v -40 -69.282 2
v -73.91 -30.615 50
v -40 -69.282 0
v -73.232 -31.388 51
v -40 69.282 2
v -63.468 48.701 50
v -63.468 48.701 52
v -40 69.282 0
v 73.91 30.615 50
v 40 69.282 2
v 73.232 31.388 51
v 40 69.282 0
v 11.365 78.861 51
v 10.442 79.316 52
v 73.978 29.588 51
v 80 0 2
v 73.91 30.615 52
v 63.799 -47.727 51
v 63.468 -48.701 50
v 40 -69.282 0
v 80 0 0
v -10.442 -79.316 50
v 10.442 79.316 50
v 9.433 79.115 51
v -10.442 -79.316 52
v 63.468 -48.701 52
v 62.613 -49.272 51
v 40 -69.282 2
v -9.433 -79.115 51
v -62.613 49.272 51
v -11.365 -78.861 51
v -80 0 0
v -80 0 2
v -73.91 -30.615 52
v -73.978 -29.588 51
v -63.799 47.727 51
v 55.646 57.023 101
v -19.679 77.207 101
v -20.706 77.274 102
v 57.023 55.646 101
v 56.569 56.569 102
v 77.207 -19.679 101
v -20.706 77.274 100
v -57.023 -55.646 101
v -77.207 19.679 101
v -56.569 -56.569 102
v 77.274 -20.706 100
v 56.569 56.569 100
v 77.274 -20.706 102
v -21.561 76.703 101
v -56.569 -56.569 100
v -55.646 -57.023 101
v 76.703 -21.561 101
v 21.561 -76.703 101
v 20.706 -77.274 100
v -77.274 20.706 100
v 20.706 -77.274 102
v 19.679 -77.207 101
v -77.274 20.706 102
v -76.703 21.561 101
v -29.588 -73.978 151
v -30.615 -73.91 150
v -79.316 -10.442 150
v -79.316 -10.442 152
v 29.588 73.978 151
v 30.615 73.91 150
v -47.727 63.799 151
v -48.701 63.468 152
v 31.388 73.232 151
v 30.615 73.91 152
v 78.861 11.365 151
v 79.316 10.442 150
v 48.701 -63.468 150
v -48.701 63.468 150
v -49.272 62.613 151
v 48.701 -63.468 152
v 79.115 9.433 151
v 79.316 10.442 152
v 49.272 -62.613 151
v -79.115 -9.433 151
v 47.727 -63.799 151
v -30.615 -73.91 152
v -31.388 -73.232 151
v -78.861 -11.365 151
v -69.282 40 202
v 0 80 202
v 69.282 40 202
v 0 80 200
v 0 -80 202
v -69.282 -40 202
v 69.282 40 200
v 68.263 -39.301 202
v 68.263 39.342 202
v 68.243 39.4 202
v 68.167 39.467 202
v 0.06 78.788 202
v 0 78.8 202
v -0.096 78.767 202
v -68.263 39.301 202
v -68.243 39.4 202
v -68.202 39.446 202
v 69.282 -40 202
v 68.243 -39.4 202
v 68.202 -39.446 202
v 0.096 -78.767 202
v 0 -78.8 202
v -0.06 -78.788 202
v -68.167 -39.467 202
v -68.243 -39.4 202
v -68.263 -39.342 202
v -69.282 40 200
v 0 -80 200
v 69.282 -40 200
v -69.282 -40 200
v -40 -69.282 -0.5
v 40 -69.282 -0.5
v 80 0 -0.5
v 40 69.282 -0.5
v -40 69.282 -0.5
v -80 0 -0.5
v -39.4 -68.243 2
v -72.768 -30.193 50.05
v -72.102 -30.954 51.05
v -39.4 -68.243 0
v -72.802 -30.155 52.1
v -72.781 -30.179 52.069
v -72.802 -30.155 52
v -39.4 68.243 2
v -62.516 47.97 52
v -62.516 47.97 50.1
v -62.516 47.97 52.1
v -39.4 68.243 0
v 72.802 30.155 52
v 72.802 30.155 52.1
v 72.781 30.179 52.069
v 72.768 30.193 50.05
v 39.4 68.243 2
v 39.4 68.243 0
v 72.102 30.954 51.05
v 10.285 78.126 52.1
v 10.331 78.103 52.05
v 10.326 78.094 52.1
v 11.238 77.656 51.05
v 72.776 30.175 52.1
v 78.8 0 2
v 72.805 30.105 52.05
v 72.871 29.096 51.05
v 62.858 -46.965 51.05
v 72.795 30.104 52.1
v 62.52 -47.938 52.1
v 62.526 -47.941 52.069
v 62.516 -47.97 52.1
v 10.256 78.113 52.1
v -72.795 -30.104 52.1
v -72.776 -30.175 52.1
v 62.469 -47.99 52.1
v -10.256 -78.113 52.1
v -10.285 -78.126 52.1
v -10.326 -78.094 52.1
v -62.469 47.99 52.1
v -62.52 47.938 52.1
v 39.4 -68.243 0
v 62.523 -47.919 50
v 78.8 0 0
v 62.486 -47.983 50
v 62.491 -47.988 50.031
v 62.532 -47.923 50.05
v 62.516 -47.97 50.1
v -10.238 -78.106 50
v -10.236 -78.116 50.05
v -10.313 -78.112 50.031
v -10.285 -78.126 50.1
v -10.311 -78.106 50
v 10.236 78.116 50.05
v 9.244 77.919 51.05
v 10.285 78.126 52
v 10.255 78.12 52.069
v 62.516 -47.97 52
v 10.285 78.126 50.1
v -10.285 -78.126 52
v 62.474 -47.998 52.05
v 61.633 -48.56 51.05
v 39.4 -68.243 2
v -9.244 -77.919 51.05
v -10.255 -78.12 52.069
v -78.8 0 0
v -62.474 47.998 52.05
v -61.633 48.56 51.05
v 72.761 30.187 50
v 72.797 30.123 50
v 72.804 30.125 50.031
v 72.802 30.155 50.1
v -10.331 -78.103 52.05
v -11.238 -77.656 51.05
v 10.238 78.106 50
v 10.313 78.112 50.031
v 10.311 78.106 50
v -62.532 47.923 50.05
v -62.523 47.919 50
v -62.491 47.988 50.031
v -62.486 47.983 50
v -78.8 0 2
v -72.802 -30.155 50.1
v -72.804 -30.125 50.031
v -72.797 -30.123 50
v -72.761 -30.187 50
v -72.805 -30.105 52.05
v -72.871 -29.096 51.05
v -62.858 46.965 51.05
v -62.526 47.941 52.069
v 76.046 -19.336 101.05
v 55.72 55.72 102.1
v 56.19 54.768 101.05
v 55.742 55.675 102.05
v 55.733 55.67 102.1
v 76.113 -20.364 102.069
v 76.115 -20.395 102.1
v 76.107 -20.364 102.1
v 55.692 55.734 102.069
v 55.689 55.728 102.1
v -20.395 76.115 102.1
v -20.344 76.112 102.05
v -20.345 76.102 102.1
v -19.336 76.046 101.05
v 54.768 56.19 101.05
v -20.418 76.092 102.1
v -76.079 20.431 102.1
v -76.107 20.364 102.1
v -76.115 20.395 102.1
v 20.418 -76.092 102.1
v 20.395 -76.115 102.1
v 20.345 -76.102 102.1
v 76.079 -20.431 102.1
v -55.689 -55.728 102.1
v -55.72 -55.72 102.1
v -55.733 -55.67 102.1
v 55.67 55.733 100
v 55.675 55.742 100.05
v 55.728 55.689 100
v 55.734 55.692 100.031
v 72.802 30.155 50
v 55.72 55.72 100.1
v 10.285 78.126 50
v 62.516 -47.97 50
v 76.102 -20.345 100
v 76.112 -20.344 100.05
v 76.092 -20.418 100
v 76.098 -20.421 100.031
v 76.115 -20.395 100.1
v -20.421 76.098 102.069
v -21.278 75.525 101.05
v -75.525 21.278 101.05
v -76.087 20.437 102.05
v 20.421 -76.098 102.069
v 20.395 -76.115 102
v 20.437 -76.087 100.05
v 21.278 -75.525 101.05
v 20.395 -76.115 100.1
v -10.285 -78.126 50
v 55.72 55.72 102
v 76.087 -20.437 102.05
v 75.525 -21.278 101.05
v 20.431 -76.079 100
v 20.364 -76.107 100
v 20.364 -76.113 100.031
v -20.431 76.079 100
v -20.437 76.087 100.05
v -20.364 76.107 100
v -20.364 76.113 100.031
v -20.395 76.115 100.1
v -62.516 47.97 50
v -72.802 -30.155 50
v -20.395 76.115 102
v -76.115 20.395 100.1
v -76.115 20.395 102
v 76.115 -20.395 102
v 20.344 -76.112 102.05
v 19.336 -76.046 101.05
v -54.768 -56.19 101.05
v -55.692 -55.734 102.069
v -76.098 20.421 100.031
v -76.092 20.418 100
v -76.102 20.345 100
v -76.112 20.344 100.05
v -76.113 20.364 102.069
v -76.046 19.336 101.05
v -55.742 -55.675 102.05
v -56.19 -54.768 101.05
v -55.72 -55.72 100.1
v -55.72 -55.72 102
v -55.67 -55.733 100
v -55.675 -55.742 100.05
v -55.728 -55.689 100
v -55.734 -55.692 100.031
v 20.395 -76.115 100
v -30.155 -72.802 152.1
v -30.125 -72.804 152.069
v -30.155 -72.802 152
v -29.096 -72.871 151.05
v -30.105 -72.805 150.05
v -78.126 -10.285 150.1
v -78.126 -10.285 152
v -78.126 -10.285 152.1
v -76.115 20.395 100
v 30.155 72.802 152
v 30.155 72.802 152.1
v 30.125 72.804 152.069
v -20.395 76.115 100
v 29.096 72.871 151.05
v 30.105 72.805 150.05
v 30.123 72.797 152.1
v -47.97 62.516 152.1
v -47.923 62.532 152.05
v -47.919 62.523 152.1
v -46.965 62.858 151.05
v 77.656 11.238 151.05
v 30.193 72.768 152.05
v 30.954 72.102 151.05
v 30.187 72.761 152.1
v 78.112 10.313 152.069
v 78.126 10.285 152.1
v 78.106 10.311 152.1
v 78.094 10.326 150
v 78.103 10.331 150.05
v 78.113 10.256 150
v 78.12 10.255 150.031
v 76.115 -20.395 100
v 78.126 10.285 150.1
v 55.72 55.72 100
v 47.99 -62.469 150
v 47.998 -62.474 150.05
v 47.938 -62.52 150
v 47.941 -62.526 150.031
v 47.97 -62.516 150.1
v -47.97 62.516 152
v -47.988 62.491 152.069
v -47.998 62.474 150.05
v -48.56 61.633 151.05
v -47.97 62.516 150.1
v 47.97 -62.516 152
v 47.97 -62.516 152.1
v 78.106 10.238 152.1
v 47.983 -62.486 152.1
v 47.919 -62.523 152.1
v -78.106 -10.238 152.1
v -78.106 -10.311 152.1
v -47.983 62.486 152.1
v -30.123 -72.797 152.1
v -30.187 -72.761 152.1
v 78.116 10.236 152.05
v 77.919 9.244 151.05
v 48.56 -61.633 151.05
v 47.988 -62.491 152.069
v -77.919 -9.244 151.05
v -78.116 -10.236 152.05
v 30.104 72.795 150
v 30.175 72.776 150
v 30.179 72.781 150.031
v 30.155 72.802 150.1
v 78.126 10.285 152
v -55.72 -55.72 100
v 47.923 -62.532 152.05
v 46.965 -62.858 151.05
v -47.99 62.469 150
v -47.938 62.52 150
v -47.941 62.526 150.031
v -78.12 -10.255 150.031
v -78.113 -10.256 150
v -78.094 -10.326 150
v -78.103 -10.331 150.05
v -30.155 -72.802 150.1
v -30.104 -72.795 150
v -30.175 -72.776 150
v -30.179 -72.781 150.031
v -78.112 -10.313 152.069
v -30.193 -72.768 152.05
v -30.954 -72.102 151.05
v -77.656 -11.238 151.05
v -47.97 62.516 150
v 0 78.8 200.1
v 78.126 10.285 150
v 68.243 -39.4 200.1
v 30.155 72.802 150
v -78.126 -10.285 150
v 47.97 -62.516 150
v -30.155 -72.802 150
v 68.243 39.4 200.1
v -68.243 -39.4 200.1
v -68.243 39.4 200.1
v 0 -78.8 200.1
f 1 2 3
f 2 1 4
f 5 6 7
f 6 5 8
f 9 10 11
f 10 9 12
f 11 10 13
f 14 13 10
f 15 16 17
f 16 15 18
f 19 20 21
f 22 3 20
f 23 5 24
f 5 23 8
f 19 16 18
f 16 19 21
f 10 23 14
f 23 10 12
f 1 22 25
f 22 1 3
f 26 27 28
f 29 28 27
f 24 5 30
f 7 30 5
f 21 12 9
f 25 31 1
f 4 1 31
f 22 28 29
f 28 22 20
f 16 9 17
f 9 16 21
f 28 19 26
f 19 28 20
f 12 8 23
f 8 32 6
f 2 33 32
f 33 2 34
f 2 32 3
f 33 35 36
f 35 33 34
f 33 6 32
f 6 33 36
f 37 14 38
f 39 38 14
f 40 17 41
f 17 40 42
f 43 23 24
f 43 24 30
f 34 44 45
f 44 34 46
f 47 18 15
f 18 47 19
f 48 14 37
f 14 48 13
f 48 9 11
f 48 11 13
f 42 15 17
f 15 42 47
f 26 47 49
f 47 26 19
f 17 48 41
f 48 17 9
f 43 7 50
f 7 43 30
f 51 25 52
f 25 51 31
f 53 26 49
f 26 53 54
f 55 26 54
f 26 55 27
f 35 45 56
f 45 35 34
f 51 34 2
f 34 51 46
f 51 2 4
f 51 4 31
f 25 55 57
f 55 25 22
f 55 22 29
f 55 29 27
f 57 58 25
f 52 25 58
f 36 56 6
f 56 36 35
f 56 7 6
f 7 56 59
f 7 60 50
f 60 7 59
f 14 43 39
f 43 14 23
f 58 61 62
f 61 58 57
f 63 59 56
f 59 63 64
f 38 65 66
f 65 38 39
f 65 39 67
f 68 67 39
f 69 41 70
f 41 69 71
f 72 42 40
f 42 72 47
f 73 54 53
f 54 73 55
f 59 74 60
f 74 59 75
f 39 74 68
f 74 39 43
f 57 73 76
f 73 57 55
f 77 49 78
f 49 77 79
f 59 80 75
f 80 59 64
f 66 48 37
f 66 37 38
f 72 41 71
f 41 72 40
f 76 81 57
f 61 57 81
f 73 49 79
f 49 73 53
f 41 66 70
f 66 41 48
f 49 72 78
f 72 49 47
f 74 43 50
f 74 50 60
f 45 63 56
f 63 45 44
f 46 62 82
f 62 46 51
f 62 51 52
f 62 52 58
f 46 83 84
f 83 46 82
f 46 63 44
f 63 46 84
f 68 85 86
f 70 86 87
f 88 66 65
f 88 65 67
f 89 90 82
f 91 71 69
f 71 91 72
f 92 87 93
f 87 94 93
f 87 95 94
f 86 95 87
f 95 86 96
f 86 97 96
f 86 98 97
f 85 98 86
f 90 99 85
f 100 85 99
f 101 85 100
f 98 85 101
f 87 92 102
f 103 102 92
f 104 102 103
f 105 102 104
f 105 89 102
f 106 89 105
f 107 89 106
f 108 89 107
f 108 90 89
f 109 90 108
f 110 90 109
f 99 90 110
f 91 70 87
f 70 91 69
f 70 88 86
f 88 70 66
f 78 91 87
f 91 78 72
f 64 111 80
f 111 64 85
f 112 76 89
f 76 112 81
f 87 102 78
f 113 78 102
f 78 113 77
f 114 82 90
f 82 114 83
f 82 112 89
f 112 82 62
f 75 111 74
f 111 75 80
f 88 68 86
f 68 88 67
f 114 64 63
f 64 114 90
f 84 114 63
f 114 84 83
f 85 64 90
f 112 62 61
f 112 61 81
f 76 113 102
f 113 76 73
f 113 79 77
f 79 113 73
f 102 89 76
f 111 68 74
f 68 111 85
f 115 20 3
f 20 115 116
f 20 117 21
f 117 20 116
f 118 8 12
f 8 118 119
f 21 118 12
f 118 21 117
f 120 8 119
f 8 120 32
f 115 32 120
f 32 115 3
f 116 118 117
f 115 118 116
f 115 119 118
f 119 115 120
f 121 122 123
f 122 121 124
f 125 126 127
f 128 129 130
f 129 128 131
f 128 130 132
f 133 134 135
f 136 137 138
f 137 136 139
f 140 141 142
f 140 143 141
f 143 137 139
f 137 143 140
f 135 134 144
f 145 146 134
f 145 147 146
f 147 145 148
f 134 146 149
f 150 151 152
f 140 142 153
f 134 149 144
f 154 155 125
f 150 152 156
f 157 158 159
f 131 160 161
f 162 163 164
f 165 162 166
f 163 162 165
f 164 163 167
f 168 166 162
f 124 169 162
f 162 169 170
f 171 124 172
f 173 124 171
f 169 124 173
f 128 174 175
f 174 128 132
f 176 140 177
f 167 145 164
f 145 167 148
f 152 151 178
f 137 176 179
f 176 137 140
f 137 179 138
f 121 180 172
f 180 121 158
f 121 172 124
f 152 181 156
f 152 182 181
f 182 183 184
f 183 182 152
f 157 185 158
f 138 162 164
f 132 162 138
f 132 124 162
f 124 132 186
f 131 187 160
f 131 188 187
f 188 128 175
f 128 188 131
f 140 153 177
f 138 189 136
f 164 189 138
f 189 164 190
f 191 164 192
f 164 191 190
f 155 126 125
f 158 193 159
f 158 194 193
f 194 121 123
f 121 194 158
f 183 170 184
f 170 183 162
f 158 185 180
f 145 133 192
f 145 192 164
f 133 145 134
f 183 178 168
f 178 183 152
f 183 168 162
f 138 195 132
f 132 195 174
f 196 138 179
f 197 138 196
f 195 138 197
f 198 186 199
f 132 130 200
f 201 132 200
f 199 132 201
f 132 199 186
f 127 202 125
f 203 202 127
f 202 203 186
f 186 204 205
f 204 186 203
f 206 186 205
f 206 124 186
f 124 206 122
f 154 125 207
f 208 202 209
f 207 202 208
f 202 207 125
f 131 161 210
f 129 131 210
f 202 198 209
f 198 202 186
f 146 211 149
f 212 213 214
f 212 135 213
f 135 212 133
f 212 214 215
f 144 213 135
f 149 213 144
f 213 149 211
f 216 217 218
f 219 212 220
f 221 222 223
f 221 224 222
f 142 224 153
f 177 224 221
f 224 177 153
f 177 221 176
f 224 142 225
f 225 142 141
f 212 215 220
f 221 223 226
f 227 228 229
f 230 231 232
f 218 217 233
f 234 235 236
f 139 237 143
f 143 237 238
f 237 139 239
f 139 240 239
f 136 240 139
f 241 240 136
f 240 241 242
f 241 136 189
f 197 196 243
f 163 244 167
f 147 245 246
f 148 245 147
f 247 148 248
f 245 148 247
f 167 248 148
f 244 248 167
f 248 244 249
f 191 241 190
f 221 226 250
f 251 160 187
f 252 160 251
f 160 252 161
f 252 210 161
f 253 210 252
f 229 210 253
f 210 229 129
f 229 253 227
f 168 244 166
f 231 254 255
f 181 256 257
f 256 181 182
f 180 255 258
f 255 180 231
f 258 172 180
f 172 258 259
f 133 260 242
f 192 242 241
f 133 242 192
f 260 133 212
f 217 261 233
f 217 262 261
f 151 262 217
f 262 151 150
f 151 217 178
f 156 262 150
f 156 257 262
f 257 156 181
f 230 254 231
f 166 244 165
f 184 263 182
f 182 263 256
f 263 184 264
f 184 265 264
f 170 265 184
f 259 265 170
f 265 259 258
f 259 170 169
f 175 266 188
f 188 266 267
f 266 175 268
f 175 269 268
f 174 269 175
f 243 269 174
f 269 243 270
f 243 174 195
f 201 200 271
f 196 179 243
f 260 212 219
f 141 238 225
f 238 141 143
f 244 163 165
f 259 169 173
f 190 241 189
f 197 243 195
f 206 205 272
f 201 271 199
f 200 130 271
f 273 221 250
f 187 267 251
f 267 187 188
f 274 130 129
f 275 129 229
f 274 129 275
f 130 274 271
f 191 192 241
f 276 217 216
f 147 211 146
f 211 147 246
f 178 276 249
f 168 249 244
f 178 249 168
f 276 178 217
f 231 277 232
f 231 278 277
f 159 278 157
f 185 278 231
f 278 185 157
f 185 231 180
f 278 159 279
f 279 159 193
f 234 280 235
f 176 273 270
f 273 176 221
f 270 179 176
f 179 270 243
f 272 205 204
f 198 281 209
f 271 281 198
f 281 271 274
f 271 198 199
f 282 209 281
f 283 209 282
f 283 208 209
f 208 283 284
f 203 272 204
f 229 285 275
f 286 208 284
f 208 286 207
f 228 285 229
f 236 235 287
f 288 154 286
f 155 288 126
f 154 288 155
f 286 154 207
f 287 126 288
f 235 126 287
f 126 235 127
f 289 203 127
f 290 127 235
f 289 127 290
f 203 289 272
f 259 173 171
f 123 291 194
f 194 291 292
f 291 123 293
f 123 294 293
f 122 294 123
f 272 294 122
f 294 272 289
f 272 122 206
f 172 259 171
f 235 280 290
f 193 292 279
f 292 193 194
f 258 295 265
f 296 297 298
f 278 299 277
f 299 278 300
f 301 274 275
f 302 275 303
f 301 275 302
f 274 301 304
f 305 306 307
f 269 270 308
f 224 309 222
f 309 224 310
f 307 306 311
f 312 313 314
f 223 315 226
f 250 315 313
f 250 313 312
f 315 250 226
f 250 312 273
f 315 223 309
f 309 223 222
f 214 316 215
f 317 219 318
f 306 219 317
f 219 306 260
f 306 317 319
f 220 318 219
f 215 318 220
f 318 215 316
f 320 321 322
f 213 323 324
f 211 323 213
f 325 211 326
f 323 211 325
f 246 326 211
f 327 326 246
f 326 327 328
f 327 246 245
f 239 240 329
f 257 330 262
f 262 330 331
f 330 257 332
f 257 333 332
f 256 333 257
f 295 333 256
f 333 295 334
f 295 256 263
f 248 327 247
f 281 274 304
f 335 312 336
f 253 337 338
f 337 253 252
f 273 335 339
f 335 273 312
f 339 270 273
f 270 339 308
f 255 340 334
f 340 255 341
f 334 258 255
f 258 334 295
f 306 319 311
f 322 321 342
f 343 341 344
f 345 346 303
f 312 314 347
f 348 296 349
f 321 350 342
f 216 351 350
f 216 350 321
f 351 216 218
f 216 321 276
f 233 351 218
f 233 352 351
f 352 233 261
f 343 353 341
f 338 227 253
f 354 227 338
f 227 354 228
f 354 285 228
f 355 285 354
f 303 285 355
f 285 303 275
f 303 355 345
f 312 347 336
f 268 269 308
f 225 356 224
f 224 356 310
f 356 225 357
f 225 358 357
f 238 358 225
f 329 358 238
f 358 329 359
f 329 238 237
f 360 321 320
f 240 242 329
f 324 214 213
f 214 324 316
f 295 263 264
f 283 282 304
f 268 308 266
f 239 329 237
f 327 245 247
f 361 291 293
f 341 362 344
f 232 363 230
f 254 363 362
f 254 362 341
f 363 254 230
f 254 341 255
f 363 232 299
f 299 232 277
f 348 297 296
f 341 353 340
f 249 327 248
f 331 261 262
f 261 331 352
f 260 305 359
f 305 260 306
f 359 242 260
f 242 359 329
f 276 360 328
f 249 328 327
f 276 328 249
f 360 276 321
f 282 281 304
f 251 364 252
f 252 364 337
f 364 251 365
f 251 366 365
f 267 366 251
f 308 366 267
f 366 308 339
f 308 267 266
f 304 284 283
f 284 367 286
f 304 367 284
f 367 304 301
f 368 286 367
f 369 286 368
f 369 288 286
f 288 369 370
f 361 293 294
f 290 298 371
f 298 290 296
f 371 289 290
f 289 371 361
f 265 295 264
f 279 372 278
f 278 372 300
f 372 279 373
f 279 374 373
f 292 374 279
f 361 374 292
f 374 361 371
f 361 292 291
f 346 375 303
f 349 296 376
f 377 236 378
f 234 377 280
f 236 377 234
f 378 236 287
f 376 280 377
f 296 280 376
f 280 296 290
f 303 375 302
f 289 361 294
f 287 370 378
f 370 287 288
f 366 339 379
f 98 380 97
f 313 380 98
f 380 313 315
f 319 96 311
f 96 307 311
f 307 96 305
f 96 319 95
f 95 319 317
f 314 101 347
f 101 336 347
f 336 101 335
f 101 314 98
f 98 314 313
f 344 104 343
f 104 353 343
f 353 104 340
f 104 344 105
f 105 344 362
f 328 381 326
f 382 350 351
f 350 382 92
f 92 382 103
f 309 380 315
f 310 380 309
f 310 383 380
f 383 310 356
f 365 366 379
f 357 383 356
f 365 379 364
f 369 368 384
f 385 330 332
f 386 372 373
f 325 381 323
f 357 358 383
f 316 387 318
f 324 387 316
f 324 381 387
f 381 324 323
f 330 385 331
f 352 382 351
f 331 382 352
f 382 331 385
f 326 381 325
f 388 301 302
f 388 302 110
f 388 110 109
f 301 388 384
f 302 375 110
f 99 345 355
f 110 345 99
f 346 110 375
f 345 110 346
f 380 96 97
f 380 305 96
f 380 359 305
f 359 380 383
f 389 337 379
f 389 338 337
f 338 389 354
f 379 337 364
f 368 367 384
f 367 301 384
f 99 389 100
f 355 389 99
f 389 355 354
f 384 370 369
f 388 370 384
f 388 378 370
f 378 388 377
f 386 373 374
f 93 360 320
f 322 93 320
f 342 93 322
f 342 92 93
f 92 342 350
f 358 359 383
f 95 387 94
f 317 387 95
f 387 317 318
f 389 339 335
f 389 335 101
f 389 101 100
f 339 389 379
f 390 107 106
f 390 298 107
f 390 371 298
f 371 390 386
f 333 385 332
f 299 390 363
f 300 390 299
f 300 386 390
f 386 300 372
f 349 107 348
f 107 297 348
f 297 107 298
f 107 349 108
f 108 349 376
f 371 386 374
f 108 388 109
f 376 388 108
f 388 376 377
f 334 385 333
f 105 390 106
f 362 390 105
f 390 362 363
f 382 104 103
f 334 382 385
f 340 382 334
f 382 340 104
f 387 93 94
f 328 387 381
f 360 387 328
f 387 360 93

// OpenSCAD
$border=1.2;
$knick_height = 50;
$knick_count = 4;
$bottom_height = 1;

difference(){
    union(){
        
        cylinder(r=80, h=1, $fn=6, center=true);
        
        for ( layer = [1:$knick_count]) {
            hull(){
                translate([0,0, $bottom_height + (layer-1)*$knick_height ]) 
                rotate([0, 0, 90/$knick_count * (layer-1) ]) 
                cylinder(r=80, h=2, $fn=6, center=true);
                
                translate([0, 0, $bottom_height + (layer)*$knick_height ]) 
                rotate([0,0,90/$knick_count * layer ]) 
                cylinder(r=80, h=2, $fn=6, center=true);             
            }
        }
    }// union
   
    union(){
        for ( layer = [1:$knick_count]) {
            hull(){
                translate([0,0, $bottom_height + (layer-1)*$knick_height ]) 
                rotate([0, 0, 90/$knick_count * (layer-1) ]) 
                cylinder(r=80-$border, h=2, $fn=6, center=true);
                
                translate([0, 0, $bottom_height + 0.1 + (layer)*$knick_height ]) 
                rotate([0,0,90/$knick_count * layer ]) 
                cylinder(r=80-$border, h=2, $fn=6, center=true);             
            }
        }
    } // union
} // difference
    
